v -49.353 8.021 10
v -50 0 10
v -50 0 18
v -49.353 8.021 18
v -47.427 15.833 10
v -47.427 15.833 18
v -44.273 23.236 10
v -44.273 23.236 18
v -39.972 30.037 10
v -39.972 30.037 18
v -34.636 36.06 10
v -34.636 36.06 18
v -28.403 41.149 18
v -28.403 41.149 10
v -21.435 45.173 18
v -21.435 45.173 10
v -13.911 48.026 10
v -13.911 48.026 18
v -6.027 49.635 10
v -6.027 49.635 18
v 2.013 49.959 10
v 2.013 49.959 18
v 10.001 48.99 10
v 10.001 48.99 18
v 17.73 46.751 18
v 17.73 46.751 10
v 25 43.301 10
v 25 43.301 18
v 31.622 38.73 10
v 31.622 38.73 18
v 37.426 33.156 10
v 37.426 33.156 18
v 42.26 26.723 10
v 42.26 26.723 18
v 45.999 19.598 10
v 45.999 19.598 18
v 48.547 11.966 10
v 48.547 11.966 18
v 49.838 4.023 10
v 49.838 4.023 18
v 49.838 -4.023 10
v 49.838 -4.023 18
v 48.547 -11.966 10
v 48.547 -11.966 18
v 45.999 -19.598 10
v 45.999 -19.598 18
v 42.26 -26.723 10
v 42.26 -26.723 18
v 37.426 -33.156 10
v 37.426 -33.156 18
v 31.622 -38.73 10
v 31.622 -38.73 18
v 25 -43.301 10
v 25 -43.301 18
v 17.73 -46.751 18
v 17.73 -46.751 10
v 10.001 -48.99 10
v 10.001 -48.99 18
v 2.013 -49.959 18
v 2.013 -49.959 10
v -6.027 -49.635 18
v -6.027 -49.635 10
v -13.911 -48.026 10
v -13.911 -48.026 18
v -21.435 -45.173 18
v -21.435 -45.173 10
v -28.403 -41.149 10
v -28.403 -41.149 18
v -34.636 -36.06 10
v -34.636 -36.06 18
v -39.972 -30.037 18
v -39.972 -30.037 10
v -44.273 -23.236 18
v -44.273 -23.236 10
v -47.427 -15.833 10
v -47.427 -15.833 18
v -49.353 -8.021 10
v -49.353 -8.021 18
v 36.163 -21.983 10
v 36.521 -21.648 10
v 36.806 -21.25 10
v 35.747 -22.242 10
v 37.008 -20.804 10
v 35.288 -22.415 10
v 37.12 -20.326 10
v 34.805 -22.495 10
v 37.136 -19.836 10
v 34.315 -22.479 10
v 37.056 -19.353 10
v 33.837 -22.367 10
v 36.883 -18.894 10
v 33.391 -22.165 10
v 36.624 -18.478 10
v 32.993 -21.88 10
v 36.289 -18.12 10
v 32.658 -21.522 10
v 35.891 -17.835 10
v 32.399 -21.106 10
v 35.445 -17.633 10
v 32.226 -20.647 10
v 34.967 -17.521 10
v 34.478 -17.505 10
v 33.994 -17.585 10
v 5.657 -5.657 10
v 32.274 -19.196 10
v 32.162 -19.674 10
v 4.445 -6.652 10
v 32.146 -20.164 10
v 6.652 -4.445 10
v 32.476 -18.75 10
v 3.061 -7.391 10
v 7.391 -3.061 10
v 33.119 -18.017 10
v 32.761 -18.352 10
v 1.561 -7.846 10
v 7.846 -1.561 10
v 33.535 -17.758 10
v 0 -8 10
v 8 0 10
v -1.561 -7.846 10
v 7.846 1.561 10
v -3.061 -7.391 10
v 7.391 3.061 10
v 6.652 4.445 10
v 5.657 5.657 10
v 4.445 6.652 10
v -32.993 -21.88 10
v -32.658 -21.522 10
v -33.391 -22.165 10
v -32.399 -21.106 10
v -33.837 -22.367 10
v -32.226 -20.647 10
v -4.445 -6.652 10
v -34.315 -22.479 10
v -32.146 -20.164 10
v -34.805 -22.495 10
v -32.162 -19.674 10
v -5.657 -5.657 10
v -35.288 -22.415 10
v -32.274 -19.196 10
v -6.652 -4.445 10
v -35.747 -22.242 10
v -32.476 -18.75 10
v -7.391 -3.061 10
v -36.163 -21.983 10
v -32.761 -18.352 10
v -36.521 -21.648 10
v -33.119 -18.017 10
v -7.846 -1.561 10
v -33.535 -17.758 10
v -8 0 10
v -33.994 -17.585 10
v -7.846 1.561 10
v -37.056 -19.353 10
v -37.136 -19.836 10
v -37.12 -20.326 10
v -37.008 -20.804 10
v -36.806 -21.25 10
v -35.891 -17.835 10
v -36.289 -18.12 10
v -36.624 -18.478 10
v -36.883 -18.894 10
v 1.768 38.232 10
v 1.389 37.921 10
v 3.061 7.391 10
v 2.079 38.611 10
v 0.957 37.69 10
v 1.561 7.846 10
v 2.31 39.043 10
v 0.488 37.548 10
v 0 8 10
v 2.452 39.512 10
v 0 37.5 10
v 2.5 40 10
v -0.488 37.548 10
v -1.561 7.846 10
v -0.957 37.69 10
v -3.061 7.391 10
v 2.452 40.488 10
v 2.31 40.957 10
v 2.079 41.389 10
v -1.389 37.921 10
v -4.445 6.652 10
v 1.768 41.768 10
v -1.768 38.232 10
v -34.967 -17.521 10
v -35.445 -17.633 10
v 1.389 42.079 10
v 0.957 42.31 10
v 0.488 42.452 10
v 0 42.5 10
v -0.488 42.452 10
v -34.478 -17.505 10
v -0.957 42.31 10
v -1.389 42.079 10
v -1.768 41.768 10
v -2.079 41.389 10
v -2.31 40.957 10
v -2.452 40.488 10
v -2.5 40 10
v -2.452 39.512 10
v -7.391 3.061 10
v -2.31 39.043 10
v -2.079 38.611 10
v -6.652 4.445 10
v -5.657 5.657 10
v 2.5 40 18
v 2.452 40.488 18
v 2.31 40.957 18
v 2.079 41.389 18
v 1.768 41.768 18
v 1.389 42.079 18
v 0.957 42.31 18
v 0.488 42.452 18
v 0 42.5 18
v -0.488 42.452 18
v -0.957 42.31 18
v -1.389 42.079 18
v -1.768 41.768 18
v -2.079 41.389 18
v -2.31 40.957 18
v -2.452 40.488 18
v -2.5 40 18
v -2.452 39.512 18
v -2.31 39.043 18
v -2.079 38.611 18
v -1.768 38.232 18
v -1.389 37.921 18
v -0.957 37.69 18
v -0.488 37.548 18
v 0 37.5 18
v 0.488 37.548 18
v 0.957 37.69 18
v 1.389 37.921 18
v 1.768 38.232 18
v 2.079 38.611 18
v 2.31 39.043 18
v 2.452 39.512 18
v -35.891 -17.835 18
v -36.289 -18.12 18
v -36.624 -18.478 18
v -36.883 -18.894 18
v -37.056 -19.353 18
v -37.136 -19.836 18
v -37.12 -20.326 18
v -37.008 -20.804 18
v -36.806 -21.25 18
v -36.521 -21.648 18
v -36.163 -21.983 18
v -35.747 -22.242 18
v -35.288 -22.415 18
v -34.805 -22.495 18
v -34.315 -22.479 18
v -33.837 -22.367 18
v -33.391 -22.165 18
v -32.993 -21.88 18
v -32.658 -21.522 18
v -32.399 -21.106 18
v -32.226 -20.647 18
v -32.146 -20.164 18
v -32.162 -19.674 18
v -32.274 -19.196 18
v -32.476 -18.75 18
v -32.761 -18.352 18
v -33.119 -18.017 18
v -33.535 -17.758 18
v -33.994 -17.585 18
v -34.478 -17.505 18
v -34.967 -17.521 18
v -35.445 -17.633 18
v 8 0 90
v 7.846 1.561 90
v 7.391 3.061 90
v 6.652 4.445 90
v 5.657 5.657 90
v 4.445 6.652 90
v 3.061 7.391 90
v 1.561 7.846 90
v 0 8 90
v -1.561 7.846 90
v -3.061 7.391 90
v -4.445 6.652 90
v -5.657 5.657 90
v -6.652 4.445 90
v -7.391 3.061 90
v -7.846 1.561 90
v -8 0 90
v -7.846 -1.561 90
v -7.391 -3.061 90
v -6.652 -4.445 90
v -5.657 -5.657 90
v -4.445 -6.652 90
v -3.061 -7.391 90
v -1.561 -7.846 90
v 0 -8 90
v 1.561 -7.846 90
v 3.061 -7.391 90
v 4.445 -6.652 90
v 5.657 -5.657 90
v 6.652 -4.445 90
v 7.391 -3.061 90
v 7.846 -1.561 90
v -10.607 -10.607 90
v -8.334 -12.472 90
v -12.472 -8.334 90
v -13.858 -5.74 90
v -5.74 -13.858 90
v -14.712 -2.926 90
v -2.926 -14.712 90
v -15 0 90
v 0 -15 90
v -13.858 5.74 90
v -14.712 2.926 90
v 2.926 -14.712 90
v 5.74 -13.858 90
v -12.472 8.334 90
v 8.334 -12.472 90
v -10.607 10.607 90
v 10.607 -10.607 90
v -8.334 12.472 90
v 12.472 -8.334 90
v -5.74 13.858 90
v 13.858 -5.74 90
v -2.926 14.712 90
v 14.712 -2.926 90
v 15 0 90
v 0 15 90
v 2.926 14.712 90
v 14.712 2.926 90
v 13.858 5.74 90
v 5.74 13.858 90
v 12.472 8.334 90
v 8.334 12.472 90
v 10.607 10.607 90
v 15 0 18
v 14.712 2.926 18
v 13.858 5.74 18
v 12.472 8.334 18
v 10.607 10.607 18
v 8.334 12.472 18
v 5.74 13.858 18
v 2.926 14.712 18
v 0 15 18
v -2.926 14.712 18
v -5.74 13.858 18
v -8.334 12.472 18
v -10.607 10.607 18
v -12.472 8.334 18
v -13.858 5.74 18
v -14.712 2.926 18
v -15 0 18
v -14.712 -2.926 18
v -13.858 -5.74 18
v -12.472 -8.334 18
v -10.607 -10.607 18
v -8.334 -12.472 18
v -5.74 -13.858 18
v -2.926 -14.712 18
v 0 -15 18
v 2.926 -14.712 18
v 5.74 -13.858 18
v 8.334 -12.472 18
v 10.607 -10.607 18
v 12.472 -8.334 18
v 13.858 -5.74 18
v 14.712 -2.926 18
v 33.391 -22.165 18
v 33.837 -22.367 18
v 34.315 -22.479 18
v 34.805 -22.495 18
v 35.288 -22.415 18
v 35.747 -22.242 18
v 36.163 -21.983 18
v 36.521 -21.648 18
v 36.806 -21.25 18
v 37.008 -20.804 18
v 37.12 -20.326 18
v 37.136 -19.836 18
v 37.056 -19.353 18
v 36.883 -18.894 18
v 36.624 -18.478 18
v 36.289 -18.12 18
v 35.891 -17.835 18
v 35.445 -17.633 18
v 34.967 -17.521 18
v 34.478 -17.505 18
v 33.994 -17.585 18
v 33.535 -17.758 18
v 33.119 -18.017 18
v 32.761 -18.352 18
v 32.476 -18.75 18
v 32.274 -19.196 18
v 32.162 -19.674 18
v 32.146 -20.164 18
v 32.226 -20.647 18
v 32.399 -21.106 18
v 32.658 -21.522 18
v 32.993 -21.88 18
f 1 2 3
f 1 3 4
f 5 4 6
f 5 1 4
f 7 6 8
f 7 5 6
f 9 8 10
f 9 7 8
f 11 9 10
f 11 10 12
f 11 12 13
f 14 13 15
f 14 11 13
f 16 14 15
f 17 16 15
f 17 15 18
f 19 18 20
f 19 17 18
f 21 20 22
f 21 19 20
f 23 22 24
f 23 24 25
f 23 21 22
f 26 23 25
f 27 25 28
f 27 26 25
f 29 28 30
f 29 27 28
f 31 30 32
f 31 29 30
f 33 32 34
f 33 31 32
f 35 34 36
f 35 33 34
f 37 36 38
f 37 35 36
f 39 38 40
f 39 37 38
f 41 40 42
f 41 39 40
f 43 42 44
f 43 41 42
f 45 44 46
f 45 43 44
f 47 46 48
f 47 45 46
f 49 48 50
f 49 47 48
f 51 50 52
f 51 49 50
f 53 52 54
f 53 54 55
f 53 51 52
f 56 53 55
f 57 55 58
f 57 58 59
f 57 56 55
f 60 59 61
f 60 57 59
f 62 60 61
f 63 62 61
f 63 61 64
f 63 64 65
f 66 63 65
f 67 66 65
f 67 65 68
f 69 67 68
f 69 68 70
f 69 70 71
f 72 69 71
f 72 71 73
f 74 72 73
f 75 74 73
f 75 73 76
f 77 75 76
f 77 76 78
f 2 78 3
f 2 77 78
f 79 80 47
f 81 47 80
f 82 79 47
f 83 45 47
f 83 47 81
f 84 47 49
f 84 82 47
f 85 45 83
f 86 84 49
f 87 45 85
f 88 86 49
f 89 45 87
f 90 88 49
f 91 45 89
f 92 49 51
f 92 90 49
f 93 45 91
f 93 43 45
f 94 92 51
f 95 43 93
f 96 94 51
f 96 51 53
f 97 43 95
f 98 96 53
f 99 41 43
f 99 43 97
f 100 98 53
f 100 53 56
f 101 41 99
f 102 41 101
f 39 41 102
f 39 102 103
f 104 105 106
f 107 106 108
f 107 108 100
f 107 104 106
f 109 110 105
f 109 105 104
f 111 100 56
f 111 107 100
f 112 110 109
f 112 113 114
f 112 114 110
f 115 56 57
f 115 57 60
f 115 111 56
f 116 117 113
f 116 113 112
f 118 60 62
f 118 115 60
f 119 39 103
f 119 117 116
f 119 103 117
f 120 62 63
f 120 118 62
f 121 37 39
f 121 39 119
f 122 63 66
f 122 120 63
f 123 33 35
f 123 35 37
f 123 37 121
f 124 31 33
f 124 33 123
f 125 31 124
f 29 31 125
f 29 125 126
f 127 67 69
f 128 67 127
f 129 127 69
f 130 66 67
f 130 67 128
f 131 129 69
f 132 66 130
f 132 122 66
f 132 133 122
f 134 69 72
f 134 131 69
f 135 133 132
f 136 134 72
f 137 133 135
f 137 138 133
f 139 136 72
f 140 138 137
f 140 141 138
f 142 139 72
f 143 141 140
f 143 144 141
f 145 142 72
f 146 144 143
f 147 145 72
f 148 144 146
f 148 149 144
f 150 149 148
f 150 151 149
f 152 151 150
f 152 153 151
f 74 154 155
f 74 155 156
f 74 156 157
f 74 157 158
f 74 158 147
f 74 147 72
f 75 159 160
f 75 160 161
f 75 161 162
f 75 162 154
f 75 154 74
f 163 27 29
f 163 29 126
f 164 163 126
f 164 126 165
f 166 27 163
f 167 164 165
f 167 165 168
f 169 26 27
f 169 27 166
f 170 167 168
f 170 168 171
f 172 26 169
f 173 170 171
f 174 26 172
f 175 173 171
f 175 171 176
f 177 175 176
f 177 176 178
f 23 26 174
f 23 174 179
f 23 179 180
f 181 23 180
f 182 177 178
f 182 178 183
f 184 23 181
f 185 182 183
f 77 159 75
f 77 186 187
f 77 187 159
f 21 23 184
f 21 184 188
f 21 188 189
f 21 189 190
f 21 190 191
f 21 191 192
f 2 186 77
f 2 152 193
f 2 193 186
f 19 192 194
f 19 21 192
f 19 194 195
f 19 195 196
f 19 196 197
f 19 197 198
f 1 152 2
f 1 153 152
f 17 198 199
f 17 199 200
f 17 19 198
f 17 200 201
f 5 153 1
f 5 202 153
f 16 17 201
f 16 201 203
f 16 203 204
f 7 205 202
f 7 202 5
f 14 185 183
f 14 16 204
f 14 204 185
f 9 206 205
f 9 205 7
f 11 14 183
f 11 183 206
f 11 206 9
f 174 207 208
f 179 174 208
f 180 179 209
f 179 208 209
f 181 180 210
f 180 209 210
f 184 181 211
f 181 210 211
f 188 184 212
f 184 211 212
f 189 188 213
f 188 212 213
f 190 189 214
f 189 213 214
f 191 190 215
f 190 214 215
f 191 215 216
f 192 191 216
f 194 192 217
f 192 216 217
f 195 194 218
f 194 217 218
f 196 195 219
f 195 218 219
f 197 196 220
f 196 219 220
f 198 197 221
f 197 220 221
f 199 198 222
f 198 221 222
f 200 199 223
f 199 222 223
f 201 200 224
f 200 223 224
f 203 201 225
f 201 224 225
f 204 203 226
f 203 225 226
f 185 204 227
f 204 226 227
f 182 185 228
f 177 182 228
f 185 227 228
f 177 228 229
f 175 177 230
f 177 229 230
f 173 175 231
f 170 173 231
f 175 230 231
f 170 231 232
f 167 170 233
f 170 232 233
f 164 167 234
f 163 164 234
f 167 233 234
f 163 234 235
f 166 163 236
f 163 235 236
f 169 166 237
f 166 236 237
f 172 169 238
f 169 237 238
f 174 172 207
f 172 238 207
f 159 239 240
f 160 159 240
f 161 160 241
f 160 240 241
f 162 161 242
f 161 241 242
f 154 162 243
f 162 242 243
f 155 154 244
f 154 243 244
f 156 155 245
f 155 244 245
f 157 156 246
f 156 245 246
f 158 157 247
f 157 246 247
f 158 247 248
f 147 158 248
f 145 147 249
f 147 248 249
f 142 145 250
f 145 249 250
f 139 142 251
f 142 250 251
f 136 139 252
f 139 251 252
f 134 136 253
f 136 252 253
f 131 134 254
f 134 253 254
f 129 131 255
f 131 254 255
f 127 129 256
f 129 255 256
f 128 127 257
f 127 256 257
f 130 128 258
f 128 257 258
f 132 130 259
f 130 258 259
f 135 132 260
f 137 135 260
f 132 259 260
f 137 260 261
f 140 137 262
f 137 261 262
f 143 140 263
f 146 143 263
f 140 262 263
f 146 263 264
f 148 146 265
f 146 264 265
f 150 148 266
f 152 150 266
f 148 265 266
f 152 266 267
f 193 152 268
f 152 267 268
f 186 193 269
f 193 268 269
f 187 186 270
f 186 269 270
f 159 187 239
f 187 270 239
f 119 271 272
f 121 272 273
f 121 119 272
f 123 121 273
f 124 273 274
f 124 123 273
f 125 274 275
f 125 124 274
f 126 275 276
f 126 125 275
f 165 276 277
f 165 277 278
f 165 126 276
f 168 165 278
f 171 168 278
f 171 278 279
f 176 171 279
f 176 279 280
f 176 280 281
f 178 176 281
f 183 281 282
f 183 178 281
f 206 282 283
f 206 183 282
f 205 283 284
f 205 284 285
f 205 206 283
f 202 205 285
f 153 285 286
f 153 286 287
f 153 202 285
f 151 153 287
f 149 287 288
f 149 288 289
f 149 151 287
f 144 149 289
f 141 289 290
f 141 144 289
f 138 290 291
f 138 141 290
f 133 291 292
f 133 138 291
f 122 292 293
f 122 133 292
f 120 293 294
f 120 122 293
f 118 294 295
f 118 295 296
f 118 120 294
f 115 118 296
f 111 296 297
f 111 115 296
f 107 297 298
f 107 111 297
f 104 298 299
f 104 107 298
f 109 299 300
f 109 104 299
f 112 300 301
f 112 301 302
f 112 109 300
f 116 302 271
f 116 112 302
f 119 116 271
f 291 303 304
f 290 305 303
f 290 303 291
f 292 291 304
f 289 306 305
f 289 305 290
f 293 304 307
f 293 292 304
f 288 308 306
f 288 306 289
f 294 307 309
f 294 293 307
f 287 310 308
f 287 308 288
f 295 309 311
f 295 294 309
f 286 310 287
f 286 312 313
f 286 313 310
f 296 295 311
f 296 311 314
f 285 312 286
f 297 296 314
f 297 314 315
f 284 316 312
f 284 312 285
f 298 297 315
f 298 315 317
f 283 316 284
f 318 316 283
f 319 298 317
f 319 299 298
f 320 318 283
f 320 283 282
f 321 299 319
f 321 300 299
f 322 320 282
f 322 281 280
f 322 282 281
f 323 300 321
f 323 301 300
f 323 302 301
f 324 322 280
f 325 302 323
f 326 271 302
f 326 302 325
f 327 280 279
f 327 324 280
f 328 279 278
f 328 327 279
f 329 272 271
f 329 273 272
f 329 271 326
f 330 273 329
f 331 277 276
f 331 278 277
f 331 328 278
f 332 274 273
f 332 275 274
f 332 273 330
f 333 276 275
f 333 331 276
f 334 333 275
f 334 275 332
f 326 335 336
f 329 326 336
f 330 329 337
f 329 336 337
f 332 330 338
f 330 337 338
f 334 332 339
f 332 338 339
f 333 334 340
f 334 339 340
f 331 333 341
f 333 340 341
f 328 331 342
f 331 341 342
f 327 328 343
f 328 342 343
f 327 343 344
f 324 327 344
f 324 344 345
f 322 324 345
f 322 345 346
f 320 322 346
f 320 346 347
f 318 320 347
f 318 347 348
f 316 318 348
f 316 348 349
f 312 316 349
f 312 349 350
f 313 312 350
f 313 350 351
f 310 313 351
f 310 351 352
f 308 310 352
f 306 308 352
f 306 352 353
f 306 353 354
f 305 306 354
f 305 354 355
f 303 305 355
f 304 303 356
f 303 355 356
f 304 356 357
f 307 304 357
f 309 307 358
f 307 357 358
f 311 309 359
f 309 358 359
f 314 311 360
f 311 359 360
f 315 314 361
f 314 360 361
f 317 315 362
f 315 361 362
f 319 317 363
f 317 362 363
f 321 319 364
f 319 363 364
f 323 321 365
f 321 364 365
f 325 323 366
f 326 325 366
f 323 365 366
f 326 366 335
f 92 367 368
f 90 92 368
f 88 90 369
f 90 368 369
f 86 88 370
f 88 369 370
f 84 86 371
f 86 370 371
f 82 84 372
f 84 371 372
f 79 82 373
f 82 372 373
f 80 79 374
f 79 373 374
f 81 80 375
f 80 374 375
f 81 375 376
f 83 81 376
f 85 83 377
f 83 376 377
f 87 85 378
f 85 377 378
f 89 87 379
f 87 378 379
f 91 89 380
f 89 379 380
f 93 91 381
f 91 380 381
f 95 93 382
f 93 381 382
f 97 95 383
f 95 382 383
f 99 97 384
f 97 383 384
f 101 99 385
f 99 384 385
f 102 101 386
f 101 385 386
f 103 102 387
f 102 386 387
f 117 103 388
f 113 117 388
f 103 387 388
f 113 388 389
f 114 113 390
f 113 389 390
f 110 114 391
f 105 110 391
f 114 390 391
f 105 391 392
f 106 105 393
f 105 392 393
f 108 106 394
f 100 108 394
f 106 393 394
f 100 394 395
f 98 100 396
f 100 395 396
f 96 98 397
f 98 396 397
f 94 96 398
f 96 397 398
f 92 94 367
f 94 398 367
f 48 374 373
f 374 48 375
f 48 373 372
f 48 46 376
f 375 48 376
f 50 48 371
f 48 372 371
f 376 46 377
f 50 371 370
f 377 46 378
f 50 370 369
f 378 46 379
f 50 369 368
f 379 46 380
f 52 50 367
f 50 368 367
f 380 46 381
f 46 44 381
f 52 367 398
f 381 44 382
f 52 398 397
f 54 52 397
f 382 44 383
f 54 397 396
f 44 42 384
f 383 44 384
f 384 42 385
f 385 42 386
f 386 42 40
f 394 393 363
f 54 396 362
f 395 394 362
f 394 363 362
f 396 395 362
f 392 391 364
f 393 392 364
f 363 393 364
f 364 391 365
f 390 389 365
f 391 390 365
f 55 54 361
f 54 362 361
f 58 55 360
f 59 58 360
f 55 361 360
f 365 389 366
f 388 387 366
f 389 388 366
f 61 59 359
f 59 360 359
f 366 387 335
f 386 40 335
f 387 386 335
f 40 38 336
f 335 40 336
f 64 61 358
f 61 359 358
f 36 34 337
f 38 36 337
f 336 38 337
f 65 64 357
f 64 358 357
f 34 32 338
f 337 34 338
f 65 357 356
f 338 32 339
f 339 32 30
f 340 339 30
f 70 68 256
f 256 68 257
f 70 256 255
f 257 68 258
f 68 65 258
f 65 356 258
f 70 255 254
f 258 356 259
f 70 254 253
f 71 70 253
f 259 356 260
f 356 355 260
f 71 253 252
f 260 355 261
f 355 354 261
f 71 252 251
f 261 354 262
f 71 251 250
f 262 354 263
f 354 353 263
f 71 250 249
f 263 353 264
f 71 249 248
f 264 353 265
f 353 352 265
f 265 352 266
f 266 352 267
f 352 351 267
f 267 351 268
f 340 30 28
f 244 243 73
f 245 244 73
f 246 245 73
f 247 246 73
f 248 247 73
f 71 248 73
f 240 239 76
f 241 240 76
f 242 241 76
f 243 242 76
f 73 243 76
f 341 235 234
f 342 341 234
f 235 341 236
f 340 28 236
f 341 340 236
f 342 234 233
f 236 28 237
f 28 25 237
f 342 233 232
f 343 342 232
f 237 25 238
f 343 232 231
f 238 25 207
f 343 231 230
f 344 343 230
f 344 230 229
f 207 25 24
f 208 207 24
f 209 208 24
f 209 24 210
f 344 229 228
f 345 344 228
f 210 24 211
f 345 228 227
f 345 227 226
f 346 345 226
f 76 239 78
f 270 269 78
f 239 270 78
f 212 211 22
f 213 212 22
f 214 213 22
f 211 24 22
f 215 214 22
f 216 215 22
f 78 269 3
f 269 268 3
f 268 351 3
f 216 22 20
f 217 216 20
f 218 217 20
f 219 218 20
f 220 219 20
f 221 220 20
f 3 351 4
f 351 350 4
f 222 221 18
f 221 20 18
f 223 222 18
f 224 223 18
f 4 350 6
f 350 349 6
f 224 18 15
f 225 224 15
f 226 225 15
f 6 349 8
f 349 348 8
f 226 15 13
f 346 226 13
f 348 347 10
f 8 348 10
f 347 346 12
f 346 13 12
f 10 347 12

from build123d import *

# Parameters (mm, degrees)
SKETCH1_R           = 15
SKETCH1_R_2         = 8
BOSS_EXTRUDE1_DEPTH = 80
SKETCH2_R           = 50
SKETCH2_R_2         = 12.5
BOSS_EXTRUDE2_DEPTH = 8
SKETCH3_R           = 2.5
CUT_EXTRUDE1_DEPTH  = 8
CIRPATTERN1_COUNT   = 3


with BuildPart() as part:
    # Sketch1 → Boss-Extrude1 (new body)
    with BuildSketch(Plane.XY.offset(10)):
        Circle(SKETCH1_R)
        Circle(SKETCH1_R_2, mode=Mode.SUBTRACT)
    extrude(amount=BOSS_EXTRUDE1_DEPTH)

    # Sketch2 → Boss-Extrude2 (add)
    with BuildSketch(Plane(origin=(0, 0, 10), x_dir=(-1, 0, 0), z_dir=(0, 0, -1))):
        Circle(SKETCH2_R)
        Circle(SKETCH2_R_2, mode=Mode.SUBTRACT)
    extrude(amount=-BOSS_EXTRUDE2_DEPTH)

    # Sketch3 → Cut-Extrude1 (cut)
    with BuildSketch(Plane.XY.offset(18)):
        with Locations((0, 40)):
            Circle(SKETCH3_R)
    cut_extrude1 = extrude(amount=-CUT_EXTRUDE1_DEPTH, mode=Mode.SUBTRACT)

    # CirPattern1: Cut-Extrude1 ×3 about axis
    cirpattern1_axis = Axis((0, 0, 0), (0, 0, 1))
    for i in range(1, CIRPATTERN1_COUNT):
        add(cut_extrude1.rotate(cirpattern1_axis, i * 360 / CIRPATTERN1_COUNT), mode=Mode.SUBTRACT)


solid = part.part
